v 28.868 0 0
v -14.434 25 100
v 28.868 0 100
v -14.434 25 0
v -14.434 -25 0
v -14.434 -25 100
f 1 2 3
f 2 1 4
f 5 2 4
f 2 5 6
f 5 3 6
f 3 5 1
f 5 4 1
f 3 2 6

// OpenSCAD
output="prism";

// 2" = 50.8mm ; I like metric so 50mm works for me :-)
size=50;

// equilaterial triangle circcumcircle radius = rc
// rc = √3 / 3 = 0.57735026919 
ETCR=0.57735026919;
// square root of 2 = 1.41421356237
SQR2=1.41421356237;


if (output == "cube") {
  cube([size,size,size]);
} else if (output == "cone") {
  cylinder(h=size,d1=size,d2=0,$fn=100);
} else if (output == "sphere") {
  translate([0,0,size/2])
  sphere(d=size,$fn=100);
} else if (output == "rectangle") {
  cube([size,size,size*2]);
} else if (output == "prism") {
  cylinder(r=size*ETCR,h=size*2,$fn=3);
} else if (output == "pyramid") {
  cylinder(h=size,d1=size*SQR2,d2=0,$fn=4);
} else if (output == "cylinder") {
  cylinder(h=size,d=size,$fn=100);
}
